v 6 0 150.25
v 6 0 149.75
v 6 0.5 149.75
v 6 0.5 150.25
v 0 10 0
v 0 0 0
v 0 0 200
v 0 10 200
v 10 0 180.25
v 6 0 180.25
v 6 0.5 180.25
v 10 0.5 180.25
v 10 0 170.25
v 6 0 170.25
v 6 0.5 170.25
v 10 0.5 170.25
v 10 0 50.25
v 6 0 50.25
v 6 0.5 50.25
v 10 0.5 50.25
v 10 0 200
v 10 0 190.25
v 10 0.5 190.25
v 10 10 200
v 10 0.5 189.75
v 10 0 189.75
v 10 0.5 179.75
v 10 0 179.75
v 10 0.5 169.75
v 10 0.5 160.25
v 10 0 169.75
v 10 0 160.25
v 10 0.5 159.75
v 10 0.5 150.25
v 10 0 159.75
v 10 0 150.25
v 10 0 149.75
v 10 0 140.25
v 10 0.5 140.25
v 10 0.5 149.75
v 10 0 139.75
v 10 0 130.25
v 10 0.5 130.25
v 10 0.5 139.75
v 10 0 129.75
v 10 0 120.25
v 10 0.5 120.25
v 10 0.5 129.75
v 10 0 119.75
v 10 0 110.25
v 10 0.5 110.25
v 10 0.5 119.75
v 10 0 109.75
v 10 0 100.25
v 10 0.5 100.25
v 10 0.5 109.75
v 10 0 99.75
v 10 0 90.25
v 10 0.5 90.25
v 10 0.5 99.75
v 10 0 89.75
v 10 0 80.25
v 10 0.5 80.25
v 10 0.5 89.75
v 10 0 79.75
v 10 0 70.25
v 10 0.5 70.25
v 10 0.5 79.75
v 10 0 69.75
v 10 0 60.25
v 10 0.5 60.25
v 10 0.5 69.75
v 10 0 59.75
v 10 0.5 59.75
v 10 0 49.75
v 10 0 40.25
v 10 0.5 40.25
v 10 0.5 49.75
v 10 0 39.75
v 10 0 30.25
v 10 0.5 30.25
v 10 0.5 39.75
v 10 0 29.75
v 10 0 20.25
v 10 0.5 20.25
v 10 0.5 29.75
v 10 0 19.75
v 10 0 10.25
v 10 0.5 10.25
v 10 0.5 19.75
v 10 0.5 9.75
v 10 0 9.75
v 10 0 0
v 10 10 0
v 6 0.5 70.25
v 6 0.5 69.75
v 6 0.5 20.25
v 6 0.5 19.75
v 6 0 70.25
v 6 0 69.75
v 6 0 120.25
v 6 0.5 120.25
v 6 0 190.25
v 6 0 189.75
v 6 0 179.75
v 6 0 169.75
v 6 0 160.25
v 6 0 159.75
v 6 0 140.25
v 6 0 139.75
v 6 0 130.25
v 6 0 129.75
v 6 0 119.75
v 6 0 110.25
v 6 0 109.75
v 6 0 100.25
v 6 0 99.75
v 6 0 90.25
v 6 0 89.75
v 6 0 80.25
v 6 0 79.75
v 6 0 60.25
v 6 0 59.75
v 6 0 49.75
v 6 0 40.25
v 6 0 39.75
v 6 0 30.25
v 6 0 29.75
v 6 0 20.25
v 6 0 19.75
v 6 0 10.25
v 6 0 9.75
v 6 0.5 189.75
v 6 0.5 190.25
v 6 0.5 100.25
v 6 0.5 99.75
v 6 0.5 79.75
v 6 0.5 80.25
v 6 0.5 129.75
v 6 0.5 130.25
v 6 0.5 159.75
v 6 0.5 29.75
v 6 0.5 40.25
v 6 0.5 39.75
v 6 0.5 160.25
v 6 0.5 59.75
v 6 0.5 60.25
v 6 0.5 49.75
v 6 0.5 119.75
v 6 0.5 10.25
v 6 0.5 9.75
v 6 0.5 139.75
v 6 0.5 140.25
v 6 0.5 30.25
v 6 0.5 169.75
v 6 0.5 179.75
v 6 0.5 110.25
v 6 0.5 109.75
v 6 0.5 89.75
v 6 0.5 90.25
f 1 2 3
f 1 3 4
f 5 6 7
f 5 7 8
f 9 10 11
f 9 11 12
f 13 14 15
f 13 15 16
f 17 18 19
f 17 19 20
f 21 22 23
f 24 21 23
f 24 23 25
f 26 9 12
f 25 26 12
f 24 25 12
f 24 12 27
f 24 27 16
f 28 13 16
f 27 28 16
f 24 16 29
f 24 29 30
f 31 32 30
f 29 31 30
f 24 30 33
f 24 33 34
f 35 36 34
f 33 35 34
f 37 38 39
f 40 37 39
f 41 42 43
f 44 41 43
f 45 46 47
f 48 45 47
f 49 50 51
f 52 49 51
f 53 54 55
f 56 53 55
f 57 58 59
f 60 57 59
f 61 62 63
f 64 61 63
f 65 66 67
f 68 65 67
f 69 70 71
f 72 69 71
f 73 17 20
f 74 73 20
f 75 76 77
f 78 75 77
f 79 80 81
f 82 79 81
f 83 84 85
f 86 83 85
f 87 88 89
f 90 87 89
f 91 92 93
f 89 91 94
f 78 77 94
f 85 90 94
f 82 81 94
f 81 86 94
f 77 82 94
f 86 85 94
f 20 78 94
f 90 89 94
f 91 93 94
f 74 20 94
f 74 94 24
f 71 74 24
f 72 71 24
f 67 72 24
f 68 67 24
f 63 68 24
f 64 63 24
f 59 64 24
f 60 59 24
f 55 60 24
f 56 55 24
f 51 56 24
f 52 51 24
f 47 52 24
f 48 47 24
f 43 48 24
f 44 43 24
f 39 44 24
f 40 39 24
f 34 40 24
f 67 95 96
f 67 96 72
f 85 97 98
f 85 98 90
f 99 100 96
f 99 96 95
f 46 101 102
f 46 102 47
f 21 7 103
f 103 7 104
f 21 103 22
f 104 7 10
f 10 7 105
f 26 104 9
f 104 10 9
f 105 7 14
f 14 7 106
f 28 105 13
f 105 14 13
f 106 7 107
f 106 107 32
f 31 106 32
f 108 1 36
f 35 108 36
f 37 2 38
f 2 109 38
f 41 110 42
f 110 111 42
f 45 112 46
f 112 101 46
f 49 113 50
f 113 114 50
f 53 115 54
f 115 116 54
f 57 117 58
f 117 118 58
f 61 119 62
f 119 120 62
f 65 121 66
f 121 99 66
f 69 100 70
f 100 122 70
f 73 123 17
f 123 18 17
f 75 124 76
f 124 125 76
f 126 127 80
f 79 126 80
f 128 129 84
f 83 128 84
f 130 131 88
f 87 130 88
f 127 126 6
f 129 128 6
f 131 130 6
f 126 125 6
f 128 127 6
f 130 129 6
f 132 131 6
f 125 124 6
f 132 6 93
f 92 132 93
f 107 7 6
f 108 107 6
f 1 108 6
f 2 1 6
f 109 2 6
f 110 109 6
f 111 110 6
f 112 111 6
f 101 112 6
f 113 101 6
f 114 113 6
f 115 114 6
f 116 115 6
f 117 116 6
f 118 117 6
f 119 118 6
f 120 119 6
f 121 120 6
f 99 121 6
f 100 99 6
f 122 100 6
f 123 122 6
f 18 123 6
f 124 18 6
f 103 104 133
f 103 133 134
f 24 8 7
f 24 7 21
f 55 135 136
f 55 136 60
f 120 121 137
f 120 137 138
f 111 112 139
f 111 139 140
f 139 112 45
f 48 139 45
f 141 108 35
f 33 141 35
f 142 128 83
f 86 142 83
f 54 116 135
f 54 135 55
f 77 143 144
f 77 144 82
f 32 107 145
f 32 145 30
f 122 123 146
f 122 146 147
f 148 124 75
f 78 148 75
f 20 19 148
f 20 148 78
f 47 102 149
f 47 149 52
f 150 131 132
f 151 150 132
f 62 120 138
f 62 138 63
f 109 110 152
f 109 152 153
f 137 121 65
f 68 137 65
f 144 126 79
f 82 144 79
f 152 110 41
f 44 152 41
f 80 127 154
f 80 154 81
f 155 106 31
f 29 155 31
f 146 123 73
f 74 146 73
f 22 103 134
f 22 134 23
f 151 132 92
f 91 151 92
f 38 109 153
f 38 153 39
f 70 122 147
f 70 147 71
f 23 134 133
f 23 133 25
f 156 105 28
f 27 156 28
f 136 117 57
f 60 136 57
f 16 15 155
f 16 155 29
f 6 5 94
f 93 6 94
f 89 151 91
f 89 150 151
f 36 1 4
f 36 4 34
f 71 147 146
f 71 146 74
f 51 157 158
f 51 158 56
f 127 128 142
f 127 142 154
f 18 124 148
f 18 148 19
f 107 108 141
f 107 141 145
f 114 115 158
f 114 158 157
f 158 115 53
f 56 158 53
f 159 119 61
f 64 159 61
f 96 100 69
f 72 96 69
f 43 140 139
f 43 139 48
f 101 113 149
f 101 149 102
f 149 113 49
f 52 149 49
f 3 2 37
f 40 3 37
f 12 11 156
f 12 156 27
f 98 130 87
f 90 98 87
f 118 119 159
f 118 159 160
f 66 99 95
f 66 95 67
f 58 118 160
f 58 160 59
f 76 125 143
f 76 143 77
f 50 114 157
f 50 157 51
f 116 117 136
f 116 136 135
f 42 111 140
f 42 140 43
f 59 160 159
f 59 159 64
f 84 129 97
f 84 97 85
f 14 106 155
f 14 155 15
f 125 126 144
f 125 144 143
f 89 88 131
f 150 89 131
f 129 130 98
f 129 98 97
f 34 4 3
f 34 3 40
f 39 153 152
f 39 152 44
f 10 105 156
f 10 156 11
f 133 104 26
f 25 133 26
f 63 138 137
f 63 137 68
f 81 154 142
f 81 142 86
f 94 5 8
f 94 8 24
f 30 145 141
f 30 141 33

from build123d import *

# Parameters (mm, degrees)
F0_W     = 10
F0_H     = 10
F1_DEPTH = 200
F2_W     = 4
F2_H     = 0.5
F3_DEPTH = 0.5


with BuildPart() as f1:
    # F0 (on Top) → F1 (new body)
    with BuildSketch(Plane.XY):
        with Locations((5, 5)):
            Rectangle(F0_W, F0_H)
    extrude(amount=F1_DEPTH)

    # F2 (on face) → F3 (cut)
    with BuildSketch(Plane.XZ):
        Polygon((6, 9.75), (10, 9.75), (10, 10), (10, 10.25), (6, 10.25), align=None)
        with Locations((8, 20)):
            Rectangle(F2_W, F2_H)
        with Locations((8, 30)):
            Rectangle(F2_W, F2_H)
        with Locations((8, 40)):
            Rectangle(F2_W, F2_H)
        with Locations((8, 50)):
            Rectangle(F2_W, F2_H)
        with Locations((8, 60)):
            Rectangle(F2_W, F2_H)
        with Locations((8, 70)):
            Rectangle(F2_W, F2_H)
        with Locations((8, 80)):
            Rectangle(F2_W, F2_H)
        with Locations((8, 90)):
            Rectangle(F2_W, F2_H)
        with Locations((8, 100)):
            Rectangle(F2_W, F2_H)
        with Locations((8, 110)):
            Rectangle(F2_W, F2_H)
        with Locations((8, 120)):
            Rectangle(F2_W, F2_H)
        with Locations((8, 130)):
            Rectangle(F2_W, F2_H)
        with Locations((8, 140)):
            Rectangle(F2_W, F2_H)
        with Locations((8, 150)):
            Rectangle(F2_W, F2_H)
        with Locations((8, 160)):
            Rectangle(F2_W, F2_H)
        with Locations((8, 170)):
            Rectangle(F2_W, F2_H)
        with Locations((8, 180)):
            Rectangle(F2_W, F2_H)
        with Locations((8, 190)):
            Rectangle(F2_W, F2_H)
    extrude(amount=-F3_DEPTH, mode=Mode.SUBTRACT)


solid = f1.part
